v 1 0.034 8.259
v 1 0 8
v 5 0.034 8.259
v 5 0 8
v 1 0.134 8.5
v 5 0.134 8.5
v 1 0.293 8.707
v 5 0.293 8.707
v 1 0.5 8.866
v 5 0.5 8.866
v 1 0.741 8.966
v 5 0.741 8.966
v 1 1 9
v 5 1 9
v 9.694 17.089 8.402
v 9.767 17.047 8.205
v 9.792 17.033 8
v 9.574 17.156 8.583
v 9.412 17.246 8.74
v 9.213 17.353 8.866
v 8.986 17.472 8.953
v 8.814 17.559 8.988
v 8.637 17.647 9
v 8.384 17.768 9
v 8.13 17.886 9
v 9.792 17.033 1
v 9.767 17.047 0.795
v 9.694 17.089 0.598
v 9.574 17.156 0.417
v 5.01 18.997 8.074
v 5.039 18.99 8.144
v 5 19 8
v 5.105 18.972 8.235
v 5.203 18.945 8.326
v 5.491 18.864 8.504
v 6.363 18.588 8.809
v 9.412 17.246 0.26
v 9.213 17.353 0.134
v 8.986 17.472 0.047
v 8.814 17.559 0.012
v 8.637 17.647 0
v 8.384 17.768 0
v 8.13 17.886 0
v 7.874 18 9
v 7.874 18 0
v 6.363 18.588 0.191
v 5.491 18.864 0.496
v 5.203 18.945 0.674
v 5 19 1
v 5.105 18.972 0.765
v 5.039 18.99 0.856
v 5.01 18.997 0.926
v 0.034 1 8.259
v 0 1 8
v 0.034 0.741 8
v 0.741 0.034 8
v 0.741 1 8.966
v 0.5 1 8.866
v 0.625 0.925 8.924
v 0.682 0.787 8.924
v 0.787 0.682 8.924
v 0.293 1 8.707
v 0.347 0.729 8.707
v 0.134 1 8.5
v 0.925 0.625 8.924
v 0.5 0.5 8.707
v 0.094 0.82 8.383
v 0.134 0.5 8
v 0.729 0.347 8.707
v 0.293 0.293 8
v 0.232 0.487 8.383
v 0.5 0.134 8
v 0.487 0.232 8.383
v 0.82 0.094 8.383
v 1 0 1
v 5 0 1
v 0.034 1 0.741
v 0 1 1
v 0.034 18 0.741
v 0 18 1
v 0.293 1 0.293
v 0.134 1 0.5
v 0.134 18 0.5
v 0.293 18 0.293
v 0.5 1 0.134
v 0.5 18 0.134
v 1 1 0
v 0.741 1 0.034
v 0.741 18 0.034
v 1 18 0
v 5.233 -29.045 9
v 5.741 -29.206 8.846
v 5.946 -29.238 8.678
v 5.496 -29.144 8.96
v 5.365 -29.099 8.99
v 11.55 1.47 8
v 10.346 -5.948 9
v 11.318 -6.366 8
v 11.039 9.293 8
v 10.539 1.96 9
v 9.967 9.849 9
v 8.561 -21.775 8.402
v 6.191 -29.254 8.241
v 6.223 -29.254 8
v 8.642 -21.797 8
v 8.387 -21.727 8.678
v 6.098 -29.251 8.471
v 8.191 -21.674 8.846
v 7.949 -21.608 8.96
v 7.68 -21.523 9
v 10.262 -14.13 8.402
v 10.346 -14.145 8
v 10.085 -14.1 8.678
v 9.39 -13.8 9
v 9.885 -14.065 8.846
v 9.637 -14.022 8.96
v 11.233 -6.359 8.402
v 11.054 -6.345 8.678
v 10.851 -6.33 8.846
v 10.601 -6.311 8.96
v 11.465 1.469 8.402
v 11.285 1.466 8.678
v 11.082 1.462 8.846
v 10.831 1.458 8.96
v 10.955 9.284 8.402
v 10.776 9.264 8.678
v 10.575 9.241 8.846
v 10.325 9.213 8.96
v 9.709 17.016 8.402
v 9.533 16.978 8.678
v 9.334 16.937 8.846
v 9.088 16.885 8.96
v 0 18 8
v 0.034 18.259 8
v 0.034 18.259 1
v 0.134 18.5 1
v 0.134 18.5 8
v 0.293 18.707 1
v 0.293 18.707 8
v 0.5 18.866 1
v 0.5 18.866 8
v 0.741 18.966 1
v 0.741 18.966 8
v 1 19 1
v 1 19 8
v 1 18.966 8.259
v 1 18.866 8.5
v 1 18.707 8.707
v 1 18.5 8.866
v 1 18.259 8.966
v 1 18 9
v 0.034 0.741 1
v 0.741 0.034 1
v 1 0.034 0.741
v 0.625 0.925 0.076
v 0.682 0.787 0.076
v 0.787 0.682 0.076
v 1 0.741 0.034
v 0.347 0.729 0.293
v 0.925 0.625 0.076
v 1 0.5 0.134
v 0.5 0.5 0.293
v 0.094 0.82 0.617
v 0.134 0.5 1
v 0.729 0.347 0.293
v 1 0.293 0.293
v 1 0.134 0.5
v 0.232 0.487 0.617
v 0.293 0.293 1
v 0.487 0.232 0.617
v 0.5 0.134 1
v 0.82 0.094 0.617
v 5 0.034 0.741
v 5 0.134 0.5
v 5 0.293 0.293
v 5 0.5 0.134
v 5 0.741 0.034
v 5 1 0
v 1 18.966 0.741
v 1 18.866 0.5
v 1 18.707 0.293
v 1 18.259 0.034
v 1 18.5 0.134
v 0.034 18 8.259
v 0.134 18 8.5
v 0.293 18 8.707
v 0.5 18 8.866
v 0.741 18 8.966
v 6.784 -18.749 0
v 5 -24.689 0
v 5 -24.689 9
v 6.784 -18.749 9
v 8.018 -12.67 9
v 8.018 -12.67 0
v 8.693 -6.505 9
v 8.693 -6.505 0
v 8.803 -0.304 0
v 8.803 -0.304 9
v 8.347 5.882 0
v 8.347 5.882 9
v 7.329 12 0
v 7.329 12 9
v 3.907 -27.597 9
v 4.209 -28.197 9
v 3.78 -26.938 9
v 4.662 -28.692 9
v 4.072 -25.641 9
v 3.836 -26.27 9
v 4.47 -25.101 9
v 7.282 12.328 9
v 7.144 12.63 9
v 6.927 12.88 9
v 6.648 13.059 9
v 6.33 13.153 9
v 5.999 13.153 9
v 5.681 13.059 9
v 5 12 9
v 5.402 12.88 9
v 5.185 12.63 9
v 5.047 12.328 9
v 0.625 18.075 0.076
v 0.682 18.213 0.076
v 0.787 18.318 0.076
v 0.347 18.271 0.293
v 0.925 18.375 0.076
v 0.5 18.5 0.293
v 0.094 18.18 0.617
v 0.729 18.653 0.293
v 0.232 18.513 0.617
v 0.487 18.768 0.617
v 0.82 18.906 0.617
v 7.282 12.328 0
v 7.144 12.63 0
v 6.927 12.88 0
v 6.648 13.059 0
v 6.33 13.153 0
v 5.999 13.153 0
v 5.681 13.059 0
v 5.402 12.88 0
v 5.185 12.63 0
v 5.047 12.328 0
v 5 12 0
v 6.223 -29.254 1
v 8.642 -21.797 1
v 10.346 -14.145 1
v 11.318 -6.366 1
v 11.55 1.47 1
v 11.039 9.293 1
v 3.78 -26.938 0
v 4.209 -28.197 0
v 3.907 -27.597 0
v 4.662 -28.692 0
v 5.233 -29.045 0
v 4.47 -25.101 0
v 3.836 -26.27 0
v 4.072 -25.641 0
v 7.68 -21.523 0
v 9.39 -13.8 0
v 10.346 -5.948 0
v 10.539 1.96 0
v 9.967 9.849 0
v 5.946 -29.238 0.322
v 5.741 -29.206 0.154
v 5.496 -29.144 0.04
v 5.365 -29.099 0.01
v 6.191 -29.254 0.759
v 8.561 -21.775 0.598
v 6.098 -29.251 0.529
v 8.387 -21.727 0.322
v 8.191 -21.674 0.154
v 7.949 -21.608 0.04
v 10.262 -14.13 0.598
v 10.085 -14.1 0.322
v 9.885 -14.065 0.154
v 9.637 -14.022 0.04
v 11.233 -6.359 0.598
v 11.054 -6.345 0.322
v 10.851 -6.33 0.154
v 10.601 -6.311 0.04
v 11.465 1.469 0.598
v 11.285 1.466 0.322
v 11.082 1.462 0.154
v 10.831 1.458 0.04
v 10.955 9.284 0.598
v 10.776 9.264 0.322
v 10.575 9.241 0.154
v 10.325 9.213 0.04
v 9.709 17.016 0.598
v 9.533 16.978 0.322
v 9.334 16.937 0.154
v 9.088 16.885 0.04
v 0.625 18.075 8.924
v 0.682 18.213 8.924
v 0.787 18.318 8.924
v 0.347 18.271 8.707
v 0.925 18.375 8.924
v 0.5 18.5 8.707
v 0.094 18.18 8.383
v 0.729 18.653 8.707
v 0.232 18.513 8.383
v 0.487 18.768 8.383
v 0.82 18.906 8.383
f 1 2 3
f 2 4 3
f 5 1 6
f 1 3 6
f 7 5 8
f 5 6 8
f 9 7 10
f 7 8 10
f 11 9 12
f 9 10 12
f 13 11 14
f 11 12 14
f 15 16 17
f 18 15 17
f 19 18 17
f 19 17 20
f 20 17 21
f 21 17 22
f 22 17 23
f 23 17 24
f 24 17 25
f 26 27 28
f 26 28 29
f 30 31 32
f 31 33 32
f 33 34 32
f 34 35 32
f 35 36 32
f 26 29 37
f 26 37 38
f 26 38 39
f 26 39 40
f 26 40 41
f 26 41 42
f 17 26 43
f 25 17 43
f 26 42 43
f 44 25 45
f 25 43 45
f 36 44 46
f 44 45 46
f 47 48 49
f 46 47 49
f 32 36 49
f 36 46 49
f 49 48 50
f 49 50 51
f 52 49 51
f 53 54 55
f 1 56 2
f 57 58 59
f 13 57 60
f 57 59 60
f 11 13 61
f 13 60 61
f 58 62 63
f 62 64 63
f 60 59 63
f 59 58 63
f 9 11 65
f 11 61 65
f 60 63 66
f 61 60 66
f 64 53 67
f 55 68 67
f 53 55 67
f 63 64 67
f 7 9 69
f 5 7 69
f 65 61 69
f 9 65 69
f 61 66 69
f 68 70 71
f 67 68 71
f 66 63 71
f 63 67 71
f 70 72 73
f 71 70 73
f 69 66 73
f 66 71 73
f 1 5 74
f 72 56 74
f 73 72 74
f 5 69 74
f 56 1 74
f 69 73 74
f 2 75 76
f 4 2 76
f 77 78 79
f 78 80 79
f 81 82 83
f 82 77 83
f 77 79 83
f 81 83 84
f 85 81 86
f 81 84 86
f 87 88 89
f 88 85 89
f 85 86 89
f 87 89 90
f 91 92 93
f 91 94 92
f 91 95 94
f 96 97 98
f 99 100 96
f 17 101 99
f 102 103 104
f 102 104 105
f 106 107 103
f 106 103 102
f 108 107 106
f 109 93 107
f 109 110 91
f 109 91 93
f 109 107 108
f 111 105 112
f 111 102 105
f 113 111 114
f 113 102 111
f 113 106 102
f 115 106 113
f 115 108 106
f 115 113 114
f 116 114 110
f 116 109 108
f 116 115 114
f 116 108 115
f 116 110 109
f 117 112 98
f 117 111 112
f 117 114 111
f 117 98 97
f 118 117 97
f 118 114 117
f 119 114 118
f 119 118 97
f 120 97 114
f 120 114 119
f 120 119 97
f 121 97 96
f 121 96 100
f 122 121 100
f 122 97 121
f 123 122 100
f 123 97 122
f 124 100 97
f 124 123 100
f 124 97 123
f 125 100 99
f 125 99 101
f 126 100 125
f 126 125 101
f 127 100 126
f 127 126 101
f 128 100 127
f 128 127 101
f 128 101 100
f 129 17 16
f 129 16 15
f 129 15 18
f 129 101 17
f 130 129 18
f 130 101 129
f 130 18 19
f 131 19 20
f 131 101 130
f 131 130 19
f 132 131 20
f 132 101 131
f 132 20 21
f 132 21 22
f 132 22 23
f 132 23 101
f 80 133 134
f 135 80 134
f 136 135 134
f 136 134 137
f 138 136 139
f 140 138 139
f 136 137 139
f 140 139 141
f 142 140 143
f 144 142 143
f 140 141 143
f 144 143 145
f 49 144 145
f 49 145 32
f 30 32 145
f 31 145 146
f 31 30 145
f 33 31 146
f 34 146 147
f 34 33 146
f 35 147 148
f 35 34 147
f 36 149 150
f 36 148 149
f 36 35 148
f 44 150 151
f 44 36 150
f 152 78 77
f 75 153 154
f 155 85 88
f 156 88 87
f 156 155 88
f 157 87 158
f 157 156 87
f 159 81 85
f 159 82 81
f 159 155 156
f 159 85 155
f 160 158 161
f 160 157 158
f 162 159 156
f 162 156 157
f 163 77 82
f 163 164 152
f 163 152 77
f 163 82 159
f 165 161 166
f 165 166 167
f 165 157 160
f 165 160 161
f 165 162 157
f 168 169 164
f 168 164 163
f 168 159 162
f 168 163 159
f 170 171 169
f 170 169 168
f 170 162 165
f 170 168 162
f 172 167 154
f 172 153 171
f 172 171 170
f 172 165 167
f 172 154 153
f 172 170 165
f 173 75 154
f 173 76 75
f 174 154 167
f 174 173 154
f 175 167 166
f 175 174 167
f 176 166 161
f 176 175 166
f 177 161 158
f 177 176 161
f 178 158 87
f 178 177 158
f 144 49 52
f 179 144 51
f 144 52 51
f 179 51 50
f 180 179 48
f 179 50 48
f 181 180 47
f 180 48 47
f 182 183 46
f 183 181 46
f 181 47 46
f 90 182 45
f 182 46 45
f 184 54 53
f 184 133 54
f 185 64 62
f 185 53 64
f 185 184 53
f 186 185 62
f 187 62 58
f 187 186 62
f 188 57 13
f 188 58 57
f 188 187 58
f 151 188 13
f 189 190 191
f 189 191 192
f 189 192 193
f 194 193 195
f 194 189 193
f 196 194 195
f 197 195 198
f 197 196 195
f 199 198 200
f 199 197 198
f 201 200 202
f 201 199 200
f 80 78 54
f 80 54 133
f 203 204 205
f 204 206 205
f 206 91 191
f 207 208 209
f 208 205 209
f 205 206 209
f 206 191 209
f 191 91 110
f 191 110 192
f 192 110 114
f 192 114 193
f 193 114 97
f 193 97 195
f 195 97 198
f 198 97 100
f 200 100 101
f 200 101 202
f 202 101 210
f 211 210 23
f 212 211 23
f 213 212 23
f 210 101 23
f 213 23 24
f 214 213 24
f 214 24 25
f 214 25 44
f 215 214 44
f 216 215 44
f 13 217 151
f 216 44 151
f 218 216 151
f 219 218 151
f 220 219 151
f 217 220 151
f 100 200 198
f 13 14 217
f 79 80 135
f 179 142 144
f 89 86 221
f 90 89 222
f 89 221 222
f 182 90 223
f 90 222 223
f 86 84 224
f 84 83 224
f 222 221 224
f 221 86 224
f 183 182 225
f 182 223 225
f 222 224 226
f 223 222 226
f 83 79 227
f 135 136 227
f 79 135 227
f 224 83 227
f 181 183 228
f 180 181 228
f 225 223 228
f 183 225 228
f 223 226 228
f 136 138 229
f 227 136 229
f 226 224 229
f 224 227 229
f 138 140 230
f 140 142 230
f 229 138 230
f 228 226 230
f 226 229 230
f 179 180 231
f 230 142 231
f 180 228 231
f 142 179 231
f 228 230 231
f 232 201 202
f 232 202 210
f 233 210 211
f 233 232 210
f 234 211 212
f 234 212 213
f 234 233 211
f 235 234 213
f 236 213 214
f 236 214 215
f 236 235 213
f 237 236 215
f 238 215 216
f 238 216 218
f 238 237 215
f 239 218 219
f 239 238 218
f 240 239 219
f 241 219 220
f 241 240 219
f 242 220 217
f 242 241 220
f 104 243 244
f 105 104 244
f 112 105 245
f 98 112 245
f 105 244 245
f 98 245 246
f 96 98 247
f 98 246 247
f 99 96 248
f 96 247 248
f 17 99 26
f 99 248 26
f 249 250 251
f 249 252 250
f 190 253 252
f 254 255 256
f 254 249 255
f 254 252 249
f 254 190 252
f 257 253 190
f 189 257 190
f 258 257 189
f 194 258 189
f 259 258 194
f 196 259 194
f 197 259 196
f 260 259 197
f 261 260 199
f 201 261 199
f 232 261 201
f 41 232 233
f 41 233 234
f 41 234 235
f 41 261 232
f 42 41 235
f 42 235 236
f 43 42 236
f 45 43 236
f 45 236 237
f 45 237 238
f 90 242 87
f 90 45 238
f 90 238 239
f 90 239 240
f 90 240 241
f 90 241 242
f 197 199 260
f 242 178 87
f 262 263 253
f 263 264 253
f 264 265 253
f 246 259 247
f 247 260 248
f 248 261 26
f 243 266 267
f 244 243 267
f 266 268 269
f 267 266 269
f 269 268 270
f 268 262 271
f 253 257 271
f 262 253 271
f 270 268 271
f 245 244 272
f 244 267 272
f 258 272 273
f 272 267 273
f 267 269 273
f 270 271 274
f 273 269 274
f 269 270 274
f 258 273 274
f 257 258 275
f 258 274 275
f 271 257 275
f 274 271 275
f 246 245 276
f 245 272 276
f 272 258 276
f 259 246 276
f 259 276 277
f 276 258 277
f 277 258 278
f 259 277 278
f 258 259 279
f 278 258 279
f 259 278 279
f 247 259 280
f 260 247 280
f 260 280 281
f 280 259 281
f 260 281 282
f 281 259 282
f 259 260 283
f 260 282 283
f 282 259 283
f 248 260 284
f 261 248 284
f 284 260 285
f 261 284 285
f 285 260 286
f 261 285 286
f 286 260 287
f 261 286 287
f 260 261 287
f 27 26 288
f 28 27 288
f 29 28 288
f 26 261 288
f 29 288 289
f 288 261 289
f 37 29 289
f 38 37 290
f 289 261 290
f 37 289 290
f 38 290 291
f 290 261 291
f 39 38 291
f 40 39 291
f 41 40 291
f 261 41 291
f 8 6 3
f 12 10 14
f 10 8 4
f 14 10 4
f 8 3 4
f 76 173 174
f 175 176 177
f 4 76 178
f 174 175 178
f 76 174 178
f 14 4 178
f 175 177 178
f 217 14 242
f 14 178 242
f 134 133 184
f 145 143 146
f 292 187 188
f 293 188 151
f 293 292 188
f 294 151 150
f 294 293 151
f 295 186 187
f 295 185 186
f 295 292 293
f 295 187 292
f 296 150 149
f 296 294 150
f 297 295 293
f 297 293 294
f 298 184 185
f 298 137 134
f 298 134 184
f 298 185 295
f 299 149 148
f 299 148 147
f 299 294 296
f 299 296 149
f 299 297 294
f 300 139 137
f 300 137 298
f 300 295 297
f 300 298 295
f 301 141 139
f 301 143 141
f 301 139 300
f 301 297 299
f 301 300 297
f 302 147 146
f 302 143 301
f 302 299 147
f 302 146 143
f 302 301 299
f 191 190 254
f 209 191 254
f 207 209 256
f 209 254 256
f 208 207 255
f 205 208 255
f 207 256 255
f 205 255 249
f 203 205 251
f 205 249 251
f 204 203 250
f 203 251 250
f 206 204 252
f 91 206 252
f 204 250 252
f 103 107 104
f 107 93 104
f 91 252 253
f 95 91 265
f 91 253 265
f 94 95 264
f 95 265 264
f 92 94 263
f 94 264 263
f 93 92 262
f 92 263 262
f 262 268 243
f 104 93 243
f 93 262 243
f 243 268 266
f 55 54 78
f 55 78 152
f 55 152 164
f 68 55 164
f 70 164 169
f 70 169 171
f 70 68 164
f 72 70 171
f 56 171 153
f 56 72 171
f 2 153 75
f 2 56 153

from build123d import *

# Parameters (mm, degrees)
PAD_DEPTH = 9
FILLET_R  = 1


with BuildPart() as part:
    # Sketch → Pad (new body)
    with BuildSketch(Plane.XY):
        with BuildLine():
            Line((0, 0), (0, 19))
            Line((0, 19), (5, 19))
            ThreePointArc((9.791817, 17.032919), (7.461019, 18.175071), (5, 19))
            ThreePointArc((6.222729, -29.25408), (11.317567, -6.36583), (9.791817, 17.032919))
            ThreePointArc((5, -24.689043), (3.859753, -27.440724), (6.222729, -29.25408))
            ThreePointArc((5, -24.689043), (8.692964, -6.505033), (7.329164, 12))
            ThreePointArc((7.329164, 12), (6.164582, 13.164582), (5, 12))
            Line((5, 0), (5, 12))
            Line((0, 0), (5, 0))
        make_face()
    extrude(amount=PAD_DEPTH)

    # Fillet
    fillet_edges = [part.edges().sort_by_distance(p)[0] for p in [
        (0, 0, 4.5),
        (0, 19, 4.5),
        (0, 9.5, 0),
        (0, 9.5, 9),
        (2.5, 19, 9),
        (2.5, 19, 0),
        (2.5, 0, 0),
        (2.5, 0, 9),
        (11.317567, -6.36583, 9),
        (11.317567, -6.36583, 0),
    ]]
    fillet(fillet_edges, radius=FILLET_R)


solid = part.part
